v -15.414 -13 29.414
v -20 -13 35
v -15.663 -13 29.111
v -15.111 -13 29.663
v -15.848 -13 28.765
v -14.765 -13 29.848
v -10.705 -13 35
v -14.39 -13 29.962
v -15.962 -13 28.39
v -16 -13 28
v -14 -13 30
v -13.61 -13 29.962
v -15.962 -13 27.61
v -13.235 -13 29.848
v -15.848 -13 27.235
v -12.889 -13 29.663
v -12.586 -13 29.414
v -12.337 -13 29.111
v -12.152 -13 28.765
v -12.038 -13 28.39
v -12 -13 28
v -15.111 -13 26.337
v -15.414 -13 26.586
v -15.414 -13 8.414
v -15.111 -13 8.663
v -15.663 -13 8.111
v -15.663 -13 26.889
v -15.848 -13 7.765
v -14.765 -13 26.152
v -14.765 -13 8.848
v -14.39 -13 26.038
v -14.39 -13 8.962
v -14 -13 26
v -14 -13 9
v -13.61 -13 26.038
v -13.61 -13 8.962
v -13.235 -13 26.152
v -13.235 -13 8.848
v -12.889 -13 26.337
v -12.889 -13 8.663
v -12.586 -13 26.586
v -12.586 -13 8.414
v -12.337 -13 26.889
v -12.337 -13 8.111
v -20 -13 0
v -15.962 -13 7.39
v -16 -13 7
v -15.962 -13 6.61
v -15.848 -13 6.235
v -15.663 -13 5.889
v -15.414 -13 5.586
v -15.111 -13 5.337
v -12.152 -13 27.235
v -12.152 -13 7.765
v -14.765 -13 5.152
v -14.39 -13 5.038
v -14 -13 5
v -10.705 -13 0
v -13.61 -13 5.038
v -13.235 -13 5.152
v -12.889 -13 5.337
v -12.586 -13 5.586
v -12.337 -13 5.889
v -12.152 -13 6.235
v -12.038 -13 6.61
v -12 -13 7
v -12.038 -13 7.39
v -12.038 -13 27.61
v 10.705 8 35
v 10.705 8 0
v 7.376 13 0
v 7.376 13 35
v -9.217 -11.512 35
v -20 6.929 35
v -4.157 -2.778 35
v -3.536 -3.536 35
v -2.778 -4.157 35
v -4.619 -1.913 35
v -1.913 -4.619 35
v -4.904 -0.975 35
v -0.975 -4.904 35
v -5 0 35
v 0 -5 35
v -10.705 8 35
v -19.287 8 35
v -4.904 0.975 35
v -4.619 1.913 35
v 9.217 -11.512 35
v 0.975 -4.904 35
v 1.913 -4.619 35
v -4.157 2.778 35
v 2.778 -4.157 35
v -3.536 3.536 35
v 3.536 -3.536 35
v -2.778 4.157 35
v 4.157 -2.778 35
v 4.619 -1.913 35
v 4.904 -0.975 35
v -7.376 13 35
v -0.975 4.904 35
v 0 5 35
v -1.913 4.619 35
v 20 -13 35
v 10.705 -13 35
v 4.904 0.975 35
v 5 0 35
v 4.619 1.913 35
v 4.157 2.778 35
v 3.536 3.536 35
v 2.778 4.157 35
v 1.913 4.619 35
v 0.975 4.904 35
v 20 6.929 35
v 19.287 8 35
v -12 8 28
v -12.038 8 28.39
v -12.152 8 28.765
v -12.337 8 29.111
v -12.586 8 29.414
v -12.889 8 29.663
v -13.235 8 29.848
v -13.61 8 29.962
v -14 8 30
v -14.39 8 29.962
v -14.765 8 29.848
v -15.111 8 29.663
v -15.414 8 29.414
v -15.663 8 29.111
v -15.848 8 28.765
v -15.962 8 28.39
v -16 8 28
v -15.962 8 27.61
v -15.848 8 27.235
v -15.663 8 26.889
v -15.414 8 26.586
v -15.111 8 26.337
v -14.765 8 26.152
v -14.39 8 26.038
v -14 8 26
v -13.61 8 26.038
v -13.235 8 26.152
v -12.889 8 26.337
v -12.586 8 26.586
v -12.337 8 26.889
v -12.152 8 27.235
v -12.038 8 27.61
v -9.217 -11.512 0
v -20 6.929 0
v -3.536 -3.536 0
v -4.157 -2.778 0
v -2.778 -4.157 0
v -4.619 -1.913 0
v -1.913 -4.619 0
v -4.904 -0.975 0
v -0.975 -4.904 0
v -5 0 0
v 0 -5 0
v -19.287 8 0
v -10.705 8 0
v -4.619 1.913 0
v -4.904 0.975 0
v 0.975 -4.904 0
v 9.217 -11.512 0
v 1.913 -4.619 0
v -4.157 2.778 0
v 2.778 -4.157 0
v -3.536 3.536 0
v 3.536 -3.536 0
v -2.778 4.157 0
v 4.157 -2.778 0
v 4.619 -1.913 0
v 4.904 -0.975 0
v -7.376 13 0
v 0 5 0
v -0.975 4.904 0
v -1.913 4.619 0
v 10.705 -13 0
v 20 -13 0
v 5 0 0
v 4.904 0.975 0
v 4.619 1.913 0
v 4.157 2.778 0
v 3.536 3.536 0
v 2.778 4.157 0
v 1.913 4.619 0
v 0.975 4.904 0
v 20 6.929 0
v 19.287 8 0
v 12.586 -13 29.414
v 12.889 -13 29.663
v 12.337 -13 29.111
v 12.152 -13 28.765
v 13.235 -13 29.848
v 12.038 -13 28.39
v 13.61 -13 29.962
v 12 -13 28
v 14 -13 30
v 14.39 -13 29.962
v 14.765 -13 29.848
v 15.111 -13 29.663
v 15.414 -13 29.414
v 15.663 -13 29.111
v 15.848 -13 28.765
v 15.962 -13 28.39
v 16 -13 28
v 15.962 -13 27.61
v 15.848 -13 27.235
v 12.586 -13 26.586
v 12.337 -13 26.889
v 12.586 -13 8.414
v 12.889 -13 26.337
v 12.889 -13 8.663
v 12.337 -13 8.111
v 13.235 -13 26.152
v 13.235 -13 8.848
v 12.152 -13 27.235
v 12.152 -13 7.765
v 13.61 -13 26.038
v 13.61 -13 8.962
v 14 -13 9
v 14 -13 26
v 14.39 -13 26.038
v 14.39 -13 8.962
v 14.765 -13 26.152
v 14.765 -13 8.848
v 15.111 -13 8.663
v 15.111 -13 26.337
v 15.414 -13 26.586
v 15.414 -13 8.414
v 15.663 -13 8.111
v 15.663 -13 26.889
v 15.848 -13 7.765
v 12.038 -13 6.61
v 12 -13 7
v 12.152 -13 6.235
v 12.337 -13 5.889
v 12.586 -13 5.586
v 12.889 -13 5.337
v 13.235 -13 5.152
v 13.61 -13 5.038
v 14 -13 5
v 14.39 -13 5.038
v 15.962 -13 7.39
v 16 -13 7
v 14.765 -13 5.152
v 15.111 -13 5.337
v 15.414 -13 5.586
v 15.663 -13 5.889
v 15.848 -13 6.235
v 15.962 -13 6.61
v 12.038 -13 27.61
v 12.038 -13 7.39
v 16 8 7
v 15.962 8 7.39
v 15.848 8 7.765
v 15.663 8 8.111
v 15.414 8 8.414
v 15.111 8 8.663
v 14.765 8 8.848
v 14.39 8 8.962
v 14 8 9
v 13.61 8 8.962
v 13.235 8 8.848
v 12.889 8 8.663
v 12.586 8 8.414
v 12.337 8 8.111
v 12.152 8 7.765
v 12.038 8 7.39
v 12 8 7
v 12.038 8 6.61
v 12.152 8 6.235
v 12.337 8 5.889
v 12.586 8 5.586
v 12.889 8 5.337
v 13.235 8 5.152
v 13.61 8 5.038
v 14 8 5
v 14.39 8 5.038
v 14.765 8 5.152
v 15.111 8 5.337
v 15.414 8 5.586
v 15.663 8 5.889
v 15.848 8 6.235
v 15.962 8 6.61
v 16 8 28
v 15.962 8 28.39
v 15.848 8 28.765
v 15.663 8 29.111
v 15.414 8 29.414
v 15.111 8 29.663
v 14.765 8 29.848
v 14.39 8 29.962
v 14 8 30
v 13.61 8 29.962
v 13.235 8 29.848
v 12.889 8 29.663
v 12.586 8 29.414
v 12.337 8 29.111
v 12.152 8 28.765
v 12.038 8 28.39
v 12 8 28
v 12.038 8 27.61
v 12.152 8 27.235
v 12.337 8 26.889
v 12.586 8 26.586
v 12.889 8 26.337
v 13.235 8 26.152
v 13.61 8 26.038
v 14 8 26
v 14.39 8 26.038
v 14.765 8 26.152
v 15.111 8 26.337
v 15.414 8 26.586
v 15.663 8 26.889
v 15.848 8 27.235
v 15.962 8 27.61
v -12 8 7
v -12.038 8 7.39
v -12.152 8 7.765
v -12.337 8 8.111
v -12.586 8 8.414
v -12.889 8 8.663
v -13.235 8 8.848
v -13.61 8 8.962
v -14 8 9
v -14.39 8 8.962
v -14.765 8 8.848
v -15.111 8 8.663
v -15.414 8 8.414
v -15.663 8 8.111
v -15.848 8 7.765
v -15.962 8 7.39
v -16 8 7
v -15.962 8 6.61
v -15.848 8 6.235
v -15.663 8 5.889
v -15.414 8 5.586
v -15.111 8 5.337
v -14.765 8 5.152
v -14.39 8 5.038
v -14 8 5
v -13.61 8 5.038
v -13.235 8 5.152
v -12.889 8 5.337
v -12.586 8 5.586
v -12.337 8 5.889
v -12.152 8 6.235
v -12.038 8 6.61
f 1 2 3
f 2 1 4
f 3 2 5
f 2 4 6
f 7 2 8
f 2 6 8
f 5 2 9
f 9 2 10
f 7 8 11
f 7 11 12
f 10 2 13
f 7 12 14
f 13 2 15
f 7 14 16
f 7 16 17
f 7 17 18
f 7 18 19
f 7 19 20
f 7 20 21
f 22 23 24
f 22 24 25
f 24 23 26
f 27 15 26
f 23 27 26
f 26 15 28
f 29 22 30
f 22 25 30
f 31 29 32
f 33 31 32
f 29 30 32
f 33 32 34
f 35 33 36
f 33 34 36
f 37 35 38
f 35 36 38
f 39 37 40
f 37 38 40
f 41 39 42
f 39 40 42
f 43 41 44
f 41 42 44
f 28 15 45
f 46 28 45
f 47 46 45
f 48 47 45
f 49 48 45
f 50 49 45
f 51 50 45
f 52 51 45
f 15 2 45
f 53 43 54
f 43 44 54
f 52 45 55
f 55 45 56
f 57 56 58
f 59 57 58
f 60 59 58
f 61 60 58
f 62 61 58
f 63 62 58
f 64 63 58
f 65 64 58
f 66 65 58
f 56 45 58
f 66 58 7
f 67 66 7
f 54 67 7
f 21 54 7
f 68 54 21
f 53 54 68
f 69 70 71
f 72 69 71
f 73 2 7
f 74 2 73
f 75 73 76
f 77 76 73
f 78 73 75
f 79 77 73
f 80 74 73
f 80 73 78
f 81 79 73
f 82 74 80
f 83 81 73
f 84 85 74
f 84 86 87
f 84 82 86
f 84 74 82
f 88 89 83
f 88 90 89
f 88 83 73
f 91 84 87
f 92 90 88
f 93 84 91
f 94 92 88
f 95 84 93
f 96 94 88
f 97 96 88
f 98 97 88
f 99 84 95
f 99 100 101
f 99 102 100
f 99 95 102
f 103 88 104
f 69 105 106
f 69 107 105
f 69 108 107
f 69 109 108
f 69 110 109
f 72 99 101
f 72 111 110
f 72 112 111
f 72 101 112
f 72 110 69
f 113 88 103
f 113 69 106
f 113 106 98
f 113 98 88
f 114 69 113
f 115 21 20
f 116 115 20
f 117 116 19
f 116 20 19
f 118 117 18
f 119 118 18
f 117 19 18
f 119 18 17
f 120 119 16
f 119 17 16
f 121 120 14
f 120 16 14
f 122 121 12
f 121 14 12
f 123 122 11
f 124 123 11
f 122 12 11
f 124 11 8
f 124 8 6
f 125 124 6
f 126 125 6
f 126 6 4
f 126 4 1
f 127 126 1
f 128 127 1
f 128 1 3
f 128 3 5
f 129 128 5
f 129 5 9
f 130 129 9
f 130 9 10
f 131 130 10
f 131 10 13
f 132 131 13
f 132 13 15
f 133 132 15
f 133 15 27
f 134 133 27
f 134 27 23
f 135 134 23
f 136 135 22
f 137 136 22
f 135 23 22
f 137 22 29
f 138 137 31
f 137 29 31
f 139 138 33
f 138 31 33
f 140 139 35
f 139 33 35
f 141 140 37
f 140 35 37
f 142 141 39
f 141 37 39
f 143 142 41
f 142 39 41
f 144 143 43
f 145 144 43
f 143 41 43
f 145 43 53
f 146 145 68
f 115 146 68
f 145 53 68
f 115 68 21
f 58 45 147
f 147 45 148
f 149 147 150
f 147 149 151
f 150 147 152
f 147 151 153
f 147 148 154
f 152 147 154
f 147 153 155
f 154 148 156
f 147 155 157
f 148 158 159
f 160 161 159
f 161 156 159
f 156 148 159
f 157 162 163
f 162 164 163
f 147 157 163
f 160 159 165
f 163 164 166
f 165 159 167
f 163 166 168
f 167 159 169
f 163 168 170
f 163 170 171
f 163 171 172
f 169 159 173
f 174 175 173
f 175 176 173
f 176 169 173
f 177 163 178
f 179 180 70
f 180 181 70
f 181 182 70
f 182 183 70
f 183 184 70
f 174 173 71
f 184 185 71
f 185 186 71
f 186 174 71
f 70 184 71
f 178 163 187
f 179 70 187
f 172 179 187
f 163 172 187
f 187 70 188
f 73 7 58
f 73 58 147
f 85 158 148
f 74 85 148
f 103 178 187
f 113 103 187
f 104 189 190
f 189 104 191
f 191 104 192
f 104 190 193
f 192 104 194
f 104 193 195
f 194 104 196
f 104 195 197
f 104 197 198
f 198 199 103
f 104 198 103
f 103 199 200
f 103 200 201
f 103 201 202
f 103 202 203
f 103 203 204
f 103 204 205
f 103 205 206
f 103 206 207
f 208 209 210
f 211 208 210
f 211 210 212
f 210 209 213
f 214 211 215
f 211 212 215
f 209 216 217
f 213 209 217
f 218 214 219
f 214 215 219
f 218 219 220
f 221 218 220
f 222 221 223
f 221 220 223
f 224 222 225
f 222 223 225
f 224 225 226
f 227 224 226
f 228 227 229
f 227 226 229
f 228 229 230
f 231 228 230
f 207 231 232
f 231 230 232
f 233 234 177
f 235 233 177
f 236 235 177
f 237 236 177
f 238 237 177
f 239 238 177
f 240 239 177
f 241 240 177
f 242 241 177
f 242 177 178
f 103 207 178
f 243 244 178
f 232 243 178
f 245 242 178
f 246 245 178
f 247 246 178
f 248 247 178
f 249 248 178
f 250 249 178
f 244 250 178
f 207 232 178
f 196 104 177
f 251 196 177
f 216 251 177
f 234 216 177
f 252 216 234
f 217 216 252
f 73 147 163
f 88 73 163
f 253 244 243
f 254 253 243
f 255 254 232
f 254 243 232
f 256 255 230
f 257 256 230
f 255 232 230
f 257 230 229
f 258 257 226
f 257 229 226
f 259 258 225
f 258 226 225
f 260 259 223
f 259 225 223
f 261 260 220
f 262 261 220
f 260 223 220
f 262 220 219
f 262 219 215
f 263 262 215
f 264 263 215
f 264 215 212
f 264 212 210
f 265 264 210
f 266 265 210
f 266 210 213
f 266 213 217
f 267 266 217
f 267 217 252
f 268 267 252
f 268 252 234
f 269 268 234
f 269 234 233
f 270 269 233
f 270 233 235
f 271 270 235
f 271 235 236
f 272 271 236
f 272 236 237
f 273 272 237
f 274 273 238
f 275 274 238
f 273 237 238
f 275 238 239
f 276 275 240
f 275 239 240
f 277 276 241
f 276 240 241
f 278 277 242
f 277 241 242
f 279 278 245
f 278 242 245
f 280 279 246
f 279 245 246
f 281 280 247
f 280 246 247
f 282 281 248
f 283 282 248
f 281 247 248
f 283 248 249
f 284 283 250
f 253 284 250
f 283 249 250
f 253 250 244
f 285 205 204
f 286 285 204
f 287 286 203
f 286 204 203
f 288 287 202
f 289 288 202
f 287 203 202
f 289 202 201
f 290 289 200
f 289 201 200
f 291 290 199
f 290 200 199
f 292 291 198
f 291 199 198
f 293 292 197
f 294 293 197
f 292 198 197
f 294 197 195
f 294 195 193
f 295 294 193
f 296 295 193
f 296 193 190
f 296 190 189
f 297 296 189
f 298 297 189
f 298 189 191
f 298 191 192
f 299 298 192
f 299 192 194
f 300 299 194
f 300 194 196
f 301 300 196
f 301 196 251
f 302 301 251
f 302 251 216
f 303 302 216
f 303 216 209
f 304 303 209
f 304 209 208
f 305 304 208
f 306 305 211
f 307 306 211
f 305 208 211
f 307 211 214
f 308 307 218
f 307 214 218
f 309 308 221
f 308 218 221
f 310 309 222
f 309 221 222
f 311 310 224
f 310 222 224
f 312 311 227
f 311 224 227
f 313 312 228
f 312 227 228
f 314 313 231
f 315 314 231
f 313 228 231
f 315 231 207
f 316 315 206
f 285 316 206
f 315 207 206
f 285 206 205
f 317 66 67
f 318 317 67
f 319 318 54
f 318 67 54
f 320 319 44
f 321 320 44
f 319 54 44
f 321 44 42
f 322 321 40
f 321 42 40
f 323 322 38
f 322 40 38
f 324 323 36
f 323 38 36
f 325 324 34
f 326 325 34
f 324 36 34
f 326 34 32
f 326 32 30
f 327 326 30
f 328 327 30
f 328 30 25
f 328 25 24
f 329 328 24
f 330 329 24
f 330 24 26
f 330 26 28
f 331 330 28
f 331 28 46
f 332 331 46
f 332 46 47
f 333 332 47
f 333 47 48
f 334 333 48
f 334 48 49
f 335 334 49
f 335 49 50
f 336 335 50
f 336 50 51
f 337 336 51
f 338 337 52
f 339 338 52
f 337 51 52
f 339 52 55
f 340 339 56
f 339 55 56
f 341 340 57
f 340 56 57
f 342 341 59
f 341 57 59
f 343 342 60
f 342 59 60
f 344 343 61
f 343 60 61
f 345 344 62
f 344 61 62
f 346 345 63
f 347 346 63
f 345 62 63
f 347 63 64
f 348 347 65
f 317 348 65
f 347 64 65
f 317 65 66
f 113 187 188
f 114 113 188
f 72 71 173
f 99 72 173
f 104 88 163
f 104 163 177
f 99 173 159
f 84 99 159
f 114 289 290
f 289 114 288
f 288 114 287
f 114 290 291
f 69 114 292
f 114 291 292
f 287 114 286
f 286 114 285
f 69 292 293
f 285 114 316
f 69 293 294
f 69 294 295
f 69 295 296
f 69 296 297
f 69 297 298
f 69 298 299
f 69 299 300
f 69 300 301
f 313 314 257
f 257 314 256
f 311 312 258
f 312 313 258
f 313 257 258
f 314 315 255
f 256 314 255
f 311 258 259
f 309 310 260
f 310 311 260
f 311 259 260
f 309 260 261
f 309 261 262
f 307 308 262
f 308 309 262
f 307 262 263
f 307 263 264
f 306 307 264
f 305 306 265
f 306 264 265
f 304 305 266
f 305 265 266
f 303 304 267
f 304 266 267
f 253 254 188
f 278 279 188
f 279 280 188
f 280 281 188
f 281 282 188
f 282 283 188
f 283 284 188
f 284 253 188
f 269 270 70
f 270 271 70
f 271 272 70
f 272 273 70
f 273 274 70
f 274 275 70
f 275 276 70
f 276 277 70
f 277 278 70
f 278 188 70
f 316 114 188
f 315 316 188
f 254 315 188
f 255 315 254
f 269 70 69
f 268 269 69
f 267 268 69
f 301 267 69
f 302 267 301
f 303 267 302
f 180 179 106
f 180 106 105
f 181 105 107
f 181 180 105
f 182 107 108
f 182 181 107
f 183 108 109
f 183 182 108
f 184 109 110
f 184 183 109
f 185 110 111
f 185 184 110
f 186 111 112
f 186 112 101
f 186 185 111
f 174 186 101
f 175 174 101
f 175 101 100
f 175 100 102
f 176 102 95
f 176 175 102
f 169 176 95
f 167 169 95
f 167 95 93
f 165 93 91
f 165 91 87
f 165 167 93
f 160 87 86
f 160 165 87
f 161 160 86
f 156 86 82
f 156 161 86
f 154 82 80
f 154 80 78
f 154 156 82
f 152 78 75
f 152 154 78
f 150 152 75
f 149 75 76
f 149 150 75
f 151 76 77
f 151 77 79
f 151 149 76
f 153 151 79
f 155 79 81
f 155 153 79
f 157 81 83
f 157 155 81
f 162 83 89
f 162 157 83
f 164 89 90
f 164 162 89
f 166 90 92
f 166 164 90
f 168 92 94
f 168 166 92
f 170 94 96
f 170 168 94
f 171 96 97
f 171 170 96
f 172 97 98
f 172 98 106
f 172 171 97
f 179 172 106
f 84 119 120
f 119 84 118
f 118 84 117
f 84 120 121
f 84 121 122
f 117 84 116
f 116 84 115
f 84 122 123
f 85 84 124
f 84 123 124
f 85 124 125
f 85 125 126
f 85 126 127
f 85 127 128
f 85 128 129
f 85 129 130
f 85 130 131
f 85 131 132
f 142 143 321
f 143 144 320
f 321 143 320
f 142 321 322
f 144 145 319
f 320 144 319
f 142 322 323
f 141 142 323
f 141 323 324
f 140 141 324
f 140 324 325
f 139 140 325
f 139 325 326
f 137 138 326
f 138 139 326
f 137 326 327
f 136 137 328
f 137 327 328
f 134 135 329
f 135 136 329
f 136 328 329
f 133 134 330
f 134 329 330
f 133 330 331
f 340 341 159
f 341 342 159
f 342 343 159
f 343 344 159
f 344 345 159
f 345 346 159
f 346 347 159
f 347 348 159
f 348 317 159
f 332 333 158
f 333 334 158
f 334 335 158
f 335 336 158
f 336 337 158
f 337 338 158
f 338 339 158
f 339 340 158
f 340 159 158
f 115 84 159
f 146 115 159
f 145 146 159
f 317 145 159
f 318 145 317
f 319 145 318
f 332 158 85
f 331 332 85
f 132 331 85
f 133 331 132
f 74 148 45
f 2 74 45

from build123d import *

# Parameters (mm, degrees)
SKETCH1_R           = 5
BOSS_EXTRUDE1_DEPTH = 35
CUT_EXTRUDE1_REACH  = 28
SKETCH2_R           = 2


with BuildPart() as part:
    # Sketch1 → Boss-Extrude1 (new body)
    with BuildSketch(Plane.XY):
        Polygon((-7.376347734, 13), (-10.704853009, 8), (-19.287228785, 8), (-20, 6.929292346), (-20, -13), (-12.193167268, -13), (-10.704853009, -13), (-9.216538749, -11.511685741), (9.216538749, -11.511685741), (10.704853009, -13), (12.193167268, -13), (20, -13), (20, 6.929292346), (19.287228785, 8), (10.704853009, 8), (7.376347734, 13), align=None)
        Circle(SKETCH1_R, mode=Mode.SUBTRACT)
    extrude(amount=BOSS_EXTRUDE1_DEPTH)

    # Sketch2 → Cut-Extrude1 (cut, up to next)
    with BuildSketch(Plane.XZ.offset(13), mode=Mode.PRIVATE) as cut_extrude1_sk1:
        with Locations((-14, 28)):
            Circle(SKETCH2_R)
    cut_extrude1_tool1 = extrude(cut_extrude1_sk1.sketch, amount=-CUT_EXTRUDE1_REACH, mode=Mode.PRIVATE) & part.part
    add(cut_extrude1_tool1.solids().sort_by_distance((-14, -13, 28))[0], mode=Mode.SUBTRACT)
    # Sketch2 → Cut-Extrude1 (cut, up to next)
    with BuildSketch(Plane.XZ.offset(13), mode=Mode.PRIVATE) as cut_extrude1_sk2:
        with Locations((14, 28)):
            Circle(SKETCH2_R)
    cut_extrude1_tool2 = extrude(cut_extrude1_sk2.sketch, amount=-CUT_EXTRUDE1_REACH, mode=Mode.PRIVATE) & part.part
    add(cut_extrude1_tool2.solids().sort_by_distance((14, -13, 28))[0], mode=Mode.SUBTRACT)
    # Sketch2 → Cut-Extrude1 (cut, up to next)
    with BuildSketch(Plane.XZ.offset(13), mode=Mode.PRIVATE) as cut_extrude1_sk3:
        with Locations((14, 7)):
            Circle(SKETCH2_R)
    cut_extrude1_tool3 = extrude(cut_extrude1_sk3.sketch, amount=-CUT_EXTRUDE1_REACH, mode=Mode.PRIVATE) & part.part
    add(cut_extrude1_tool3.solids().sort_by_distance((14, -13, 7))[0], mode=Mode.SUBTRACT)
    # Sketch2 → Cut-Extrude1 (cut, up to next)
    with BuildSketch(Plane.XZ.offset(13), mode=Mode.PRIVATE) as cut_extrude1_sk4:
        with Locations((-14, 7)):
            Circle(SKETCH2_R)
    cut_extrude1_tool4 = extrude(cut_extrude1_sk4.sketch, amount=-CUT_EXTRUDE1_REACH, mode=Mode.PRIVATE) & part.part
    add(cut_extrude1_tool4.solids().sort_by_distance((-14, -13, 7))[0], mode=Mode.SUBTRACT)


solid = part.part
